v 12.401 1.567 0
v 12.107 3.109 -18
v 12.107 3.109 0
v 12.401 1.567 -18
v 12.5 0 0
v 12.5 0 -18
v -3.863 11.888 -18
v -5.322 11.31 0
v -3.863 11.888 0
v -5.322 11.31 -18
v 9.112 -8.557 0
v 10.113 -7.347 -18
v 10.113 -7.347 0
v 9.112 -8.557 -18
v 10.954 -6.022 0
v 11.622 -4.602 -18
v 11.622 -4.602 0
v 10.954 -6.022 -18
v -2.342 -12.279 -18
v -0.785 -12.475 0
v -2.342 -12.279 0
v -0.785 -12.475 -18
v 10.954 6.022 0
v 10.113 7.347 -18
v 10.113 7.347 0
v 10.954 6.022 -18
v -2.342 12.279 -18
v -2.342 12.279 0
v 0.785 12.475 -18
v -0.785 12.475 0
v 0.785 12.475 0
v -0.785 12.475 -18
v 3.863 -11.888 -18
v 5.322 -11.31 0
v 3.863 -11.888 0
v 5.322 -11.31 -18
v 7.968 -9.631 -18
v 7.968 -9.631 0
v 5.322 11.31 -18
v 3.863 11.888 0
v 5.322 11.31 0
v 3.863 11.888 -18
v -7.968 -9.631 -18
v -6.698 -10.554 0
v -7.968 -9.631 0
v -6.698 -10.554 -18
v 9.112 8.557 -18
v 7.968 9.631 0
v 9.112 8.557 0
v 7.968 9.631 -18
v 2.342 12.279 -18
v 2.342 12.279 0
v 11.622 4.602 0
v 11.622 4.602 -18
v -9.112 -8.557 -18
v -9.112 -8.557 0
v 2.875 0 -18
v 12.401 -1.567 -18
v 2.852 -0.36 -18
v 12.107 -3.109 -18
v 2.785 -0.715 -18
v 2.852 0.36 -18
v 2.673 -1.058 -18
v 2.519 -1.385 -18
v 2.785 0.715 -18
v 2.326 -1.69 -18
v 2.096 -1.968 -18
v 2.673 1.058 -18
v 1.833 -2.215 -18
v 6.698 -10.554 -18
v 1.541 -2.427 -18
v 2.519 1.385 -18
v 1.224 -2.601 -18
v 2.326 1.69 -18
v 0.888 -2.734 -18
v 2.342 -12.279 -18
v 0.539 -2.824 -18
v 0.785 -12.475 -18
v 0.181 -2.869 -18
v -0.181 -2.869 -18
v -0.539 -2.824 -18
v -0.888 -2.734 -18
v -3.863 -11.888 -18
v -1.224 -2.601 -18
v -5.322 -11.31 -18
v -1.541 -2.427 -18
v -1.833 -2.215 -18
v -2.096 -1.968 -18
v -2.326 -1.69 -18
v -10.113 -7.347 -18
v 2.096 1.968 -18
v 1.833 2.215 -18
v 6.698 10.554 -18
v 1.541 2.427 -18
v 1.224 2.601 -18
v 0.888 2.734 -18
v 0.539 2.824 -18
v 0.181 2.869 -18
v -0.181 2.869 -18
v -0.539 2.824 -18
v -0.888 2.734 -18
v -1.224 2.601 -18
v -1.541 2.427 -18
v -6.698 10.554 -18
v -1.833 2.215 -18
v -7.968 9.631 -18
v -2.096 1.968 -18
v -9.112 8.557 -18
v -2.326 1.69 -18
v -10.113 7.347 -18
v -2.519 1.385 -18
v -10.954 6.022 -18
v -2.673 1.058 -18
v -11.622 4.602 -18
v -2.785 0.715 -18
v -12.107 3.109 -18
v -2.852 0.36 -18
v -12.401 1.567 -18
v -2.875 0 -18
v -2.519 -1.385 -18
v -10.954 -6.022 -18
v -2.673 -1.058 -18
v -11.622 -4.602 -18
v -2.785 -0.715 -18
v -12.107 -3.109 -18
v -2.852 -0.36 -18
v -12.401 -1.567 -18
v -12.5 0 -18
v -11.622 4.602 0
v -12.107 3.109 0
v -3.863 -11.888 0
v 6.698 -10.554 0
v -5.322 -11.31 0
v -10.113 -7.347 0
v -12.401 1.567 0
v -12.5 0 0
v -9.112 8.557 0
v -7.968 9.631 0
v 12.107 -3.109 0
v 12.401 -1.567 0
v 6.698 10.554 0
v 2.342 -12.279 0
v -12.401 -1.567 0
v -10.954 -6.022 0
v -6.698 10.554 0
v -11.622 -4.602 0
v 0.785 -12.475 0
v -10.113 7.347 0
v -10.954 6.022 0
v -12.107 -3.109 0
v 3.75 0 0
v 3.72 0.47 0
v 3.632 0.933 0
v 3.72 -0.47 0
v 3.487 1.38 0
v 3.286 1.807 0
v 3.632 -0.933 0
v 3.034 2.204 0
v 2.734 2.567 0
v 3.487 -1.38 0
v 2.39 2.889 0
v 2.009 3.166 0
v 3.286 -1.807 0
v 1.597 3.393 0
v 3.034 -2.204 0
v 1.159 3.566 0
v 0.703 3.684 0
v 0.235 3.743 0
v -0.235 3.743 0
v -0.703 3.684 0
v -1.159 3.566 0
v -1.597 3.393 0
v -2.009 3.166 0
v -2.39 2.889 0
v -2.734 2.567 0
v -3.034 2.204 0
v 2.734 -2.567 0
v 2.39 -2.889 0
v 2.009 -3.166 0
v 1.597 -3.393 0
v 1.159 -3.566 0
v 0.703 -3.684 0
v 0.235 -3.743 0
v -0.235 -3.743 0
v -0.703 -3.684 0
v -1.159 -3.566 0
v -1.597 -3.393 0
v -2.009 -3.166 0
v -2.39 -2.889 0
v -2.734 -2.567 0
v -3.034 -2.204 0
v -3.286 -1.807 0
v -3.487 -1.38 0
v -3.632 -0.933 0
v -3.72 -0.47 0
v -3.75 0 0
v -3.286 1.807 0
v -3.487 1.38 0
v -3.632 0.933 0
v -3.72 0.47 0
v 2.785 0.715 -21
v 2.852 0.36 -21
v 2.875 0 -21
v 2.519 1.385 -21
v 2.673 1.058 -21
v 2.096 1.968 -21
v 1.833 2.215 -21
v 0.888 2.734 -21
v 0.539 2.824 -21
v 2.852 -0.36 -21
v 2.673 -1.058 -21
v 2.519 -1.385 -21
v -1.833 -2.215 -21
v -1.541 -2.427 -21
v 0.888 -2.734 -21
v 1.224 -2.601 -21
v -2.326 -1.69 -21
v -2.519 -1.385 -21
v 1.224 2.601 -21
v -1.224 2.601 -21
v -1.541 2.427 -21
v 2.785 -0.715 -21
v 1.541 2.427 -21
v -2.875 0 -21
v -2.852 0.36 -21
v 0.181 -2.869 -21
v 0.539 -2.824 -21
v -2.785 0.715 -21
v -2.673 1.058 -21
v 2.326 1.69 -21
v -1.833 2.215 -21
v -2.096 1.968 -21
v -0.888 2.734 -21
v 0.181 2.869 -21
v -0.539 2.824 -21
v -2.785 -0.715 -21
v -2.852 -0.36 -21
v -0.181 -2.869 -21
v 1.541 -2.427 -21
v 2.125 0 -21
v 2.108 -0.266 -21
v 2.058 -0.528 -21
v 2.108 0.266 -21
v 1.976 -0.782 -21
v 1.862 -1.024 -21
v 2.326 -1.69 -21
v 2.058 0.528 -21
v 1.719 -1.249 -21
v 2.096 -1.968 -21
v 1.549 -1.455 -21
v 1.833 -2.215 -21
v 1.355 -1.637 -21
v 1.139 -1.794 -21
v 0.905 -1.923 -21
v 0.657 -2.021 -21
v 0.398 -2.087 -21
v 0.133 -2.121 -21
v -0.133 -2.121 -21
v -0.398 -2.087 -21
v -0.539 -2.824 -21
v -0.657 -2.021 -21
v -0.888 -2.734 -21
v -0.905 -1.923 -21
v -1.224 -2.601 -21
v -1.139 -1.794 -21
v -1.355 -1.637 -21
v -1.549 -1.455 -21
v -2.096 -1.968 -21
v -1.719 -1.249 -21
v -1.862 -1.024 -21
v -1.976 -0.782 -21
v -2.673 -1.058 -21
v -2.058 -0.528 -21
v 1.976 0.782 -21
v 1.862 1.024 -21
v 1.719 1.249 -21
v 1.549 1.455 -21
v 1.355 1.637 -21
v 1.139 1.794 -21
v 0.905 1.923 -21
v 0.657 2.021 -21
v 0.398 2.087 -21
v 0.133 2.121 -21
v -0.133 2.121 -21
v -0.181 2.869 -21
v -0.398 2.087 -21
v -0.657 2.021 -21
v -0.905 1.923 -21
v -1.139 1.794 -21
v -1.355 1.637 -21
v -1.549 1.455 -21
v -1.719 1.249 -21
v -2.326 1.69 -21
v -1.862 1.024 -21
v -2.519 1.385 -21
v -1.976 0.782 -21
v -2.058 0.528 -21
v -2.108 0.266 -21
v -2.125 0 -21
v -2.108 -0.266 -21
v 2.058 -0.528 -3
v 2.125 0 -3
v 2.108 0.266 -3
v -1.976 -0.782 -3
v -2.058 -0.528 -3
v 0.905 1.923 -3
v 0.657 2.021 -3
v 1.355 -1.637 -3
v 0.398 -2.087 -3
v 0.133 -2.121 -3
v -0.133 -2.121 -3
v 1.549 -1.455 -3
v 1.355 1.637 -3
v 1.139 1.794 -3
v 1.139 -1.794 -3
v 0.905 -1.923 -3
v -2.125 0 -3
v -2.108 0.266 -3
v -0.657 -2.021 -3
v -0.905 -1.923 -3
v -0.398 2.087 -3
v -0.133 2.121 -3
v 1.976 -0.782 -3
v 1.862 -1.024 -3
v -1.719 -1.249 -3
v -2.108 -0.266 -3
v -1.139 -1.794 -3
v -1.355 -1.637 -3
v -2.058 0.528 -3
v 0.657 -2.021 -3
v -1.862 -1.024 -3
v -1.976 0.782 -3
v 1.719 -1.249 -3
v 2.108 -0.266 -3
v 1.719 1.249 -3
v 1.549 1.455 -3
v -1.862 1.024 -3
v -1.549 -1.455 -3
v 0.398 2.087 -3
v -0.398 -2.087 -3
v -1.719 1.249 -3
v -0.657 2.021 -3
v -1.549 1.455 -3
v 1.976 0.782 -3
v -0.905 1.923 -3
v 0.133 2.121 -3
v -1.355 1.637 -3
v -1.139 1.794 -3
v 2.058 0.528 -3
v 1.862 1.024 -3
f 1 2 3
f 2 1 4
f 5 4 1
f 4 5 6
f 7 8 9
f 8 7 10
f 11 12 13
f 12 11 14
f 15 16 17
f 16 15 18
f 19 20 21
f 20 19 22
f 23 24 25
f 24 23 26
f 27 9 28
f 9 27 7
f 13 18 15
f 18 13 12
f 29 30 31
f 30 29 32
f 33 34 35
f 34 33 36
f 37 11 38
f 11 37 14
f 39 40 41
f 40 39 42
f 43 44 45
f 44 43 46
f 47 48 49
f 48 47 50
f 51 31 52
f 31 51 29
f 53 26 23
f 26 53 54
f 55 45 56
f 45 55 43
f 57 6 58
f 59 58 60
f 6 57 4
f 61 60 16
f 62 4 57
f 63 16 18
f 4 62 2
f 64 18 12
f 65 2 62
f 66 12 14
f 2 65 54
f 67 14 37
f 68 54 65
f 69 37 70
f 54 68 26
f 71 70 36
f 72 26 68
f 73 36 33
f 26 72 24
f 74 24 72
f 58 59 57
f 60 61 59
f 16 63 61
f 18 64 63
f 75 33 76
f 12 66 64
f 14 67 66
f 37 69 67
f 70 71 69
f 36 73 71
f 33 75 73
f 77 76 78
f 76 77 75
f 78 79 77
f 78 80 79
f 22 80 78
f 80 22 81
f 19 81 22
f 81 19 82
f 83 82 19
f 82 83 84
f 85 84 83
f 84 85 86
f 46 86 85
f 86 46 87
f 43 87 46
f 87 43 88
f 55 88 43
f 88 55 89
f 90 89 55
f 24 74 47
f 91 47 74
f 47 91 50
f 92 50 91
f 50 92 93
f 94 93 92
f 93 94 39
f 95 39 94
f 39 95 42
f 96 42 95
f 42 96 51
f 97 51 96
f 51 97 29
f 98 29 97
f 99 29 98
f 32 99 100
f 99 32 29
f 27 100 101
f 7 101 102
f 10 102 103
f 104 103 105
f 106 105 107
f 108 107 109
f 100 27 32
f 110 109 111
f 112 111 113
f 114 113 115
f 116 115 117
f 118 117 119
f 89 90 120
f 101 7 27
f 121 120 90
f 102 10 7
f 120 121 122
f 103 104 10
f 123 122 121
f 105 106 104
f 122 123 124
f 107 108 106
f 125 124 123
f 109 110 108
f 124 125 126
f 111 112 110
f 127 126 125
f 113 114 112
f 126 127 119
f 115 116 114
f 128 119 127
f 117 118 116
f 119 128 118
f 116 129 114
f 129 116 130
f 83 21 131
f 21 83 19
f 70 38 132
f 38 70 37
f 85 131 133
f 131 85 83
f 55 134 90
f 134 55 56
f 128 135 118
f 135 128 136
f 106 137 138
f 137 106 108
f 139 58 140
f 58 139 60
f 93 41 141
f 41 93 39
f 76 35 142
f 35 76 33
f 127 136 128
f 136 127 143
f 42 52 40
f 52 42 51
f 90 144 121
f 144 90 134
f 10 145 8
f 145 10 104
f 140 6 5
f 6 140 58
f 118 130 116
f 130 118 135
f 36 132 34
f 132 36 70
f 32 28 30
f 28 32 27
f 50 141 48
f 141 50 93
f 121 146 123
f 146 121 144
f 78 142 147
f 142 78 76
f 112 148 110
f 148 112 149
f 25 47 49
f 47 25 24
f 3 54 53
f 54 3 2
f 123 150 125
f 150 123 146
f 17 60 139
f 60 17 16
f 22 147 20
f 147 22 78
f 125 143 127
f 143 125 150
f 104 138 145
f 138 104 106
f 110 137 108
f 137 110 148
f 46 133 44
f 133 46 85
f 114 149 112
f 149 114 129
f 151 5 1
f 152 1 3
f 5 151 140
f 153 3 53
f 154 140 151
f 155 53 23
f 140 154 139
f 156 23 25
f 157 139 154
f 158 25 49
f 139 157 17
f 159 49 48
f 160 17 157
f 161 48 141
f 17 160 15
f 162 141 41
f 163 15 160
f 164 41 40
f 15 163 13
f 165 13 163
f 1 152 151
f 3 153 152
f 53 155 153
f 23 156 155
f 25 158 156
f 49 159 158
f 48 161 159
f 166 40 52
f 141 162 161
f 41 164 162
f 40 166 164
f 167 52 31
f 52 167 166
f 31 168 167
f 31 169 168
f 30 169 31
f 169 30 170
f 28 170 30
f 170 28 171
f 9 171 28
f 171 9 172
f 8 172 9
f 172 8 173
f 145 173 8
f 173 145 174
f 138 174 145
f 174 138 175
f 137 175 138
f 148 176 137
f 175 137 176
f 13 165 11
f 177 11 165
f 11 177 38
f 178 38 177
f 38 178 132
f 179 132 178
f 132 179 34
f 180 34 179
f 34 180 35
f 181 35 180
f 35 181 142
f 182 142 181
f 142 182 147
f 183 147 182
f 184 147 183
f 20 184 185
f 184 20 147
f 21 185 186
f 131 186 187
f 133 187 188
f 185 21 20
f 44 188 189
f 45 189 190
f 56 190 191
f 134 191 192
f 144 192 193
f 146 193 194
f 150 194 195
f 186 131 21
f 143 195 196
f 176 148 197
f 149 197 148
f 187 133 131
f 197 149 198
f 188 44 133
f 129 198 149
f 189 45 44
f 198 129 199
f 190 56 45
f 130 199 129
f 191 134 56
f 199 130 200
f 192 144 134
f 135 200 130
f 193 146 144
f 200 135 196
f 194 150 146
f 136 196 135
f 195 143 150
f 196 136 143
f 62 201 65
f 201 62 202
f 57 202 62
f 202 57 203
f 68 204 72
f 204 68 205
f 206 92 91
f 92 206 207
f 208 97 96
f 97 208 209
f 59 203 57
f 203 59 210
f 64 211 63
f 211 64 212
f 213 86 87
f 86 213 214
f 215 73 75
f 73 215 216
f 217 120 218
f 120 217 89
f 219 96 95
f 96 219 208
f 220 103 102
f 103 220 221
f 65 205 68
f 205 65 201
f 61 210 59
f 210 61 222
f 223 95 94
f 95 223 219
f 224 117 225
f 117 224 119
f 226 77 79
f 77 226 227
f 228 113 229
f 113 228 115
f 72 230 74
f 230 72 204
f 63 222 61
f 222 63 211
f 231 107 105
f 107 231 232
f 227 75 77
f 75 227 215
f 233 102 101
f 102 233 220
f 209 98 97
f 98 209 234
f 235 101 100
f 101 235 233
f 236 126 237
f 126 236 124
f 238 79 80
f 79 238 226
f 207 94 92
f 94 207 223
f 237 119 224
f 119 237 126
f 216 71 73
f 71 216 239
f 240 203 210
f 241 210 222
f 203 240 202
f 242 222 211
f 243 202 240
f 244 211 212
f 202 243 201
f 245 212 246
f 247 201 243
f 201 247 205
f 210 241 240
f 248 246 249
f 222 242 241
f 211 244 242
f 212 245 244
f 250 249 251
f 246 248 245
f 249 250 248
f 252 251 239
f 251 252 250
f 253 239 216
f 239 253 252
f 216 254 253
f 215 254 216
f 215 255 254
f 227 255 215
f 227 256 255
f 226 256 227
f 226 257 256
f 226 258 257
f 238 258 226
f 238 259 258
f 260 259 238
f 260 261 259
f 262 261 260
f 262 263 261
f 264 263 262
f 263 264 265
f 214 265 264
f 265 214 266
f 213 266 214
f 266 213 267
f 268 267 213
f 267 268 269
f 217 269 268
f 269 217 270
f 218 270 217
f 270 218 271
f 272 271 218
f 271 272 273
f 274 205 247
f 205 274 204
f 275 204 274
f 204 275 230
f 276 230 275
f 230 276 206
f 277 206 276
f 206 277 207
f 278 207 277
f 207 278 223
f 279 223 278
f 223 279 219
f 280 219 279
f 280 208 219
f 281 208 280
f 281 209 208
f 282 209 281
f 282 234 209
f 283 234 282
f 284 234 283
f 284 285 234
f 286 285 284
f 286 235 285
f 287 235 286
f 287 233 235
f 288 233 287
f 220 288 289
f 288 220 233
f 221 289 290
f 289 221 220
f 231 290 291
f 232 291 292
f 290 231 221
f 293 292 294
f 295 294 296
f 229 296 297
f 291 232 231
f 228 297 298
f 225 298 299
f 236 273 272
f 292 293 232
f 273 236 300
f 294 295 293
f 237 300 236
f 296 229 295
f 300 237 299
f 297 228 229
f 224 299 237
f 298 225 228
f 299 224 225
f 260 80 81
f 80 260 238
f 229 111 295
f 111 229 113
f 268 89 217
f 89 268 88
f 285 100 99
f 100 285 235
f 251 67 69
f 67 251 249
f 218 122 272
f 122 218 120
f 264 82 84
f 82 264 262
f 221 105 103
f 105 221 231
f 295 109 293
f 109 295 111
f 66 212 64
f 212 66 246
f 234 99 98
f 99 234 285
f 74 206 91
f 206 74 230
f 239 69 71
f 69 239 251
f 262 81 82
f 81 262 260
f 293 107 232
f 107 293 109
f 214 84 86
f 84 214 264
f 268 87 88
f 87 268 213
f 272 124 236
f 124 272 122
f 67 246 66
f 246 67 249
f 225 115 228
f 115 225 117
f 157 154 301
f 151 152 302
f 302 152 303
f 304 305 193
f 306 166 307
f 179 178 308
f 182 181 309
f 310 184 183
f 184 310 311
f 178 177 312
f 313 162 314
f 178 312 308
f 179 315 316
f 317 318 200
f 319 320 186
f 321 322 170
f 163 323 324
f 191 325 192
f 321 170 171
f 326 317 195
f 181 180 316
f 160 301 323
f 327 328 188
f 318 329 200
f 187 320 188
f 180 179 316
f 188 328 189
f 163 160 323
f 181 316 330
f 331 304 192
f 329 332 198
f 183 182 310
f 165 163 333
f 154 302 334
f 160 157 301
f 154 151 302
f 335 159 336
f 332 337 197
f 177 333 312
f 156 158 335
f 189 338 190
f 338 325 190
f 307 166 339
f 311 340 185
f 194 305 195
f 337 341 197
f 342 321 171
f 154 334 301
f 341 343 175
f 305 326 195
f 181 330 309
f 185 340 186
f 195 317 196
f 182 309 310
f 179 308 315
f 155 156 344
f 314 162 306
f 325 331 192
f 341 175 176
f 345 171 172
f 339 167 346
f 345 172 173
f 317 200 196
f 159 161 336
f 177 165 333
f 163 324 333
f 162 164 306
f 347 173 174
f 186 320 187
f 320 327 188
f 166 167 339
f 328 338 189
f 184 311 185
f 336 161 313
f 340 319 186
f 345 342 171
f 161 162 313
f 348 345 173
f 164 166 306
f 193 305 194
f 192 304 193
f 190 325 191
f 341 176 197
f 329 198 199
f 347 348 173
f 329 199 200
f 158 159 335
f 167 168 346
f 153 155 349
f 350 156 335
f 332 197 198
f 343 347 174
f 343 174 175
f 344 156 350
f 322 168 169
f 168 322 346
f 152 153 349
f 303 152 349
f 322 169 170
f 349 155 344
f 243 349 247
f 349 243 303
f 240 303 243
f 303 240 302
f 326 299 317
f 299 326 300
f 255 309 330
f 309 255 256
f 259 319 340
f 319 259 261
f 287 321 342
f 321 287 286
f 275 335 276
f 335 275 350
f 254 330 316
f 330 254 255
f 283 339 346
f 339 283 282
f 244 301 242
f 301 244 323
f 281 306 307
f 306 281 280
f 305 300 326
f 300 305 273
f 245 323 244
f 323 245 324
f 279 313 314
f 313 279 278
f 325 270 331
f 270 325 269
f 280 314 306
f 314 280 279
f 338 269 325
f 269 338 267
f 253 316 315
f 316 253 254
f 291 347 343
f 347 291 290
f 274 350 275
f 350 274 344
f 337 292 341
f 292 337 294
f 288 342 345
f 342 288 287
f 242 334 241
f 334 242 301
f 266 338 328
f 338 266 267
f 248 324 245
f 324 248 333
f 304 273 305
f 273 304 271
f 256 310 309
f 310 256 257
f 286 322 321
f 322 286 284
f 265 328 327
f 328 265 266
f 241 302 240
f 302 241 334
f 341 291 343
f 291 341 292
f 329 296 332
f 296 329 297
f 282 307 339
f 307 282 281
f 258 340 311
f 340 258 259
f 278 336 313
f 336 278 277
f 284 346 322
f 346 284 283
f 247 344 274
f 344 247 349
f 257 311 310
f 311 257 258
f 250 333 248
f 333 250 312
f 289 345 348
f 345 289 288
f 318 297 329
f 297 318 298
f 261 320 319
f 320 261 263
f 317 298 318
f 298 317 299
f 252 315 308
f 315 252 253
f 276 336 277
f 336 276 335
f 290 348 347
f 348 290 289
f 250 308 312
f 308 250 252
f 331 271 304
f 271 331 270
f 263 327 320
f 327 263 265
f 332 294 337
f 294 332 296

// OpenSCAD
$fn = 50;

difference() {
	union() {
		translate(v = [0, 0, -18.0]) {
			cylinder(h = 18, r = 12.5);
		}
		#translate(v = [0, 0, -21.0]) {
			cylinder(h = 21, r = 2.875);
		}
	}
	union() {
		translate(v = [0, 0, 0]) {
			rotate(a = [0, 0, 0]) {
				difference() {
					union() {
						translate(v = [0, 0, -21.0]) {
							cylinder(h = 21, r = 2.0);
						}
						translate(v = [0, 0, -3]) {
							cylinder(h = 3, r1 = 2.125, r2 = 3.75);
						}
						translate(v = [0, 0, -21.0]) {
							cylinder(h = 21, r = 2.125);
						}
						translate(v = [0, 0, -21.0]) {
							cylinder(h = 21, r = 2.0);
						}
					}
					union();
				}
			}
		}
	}
}
